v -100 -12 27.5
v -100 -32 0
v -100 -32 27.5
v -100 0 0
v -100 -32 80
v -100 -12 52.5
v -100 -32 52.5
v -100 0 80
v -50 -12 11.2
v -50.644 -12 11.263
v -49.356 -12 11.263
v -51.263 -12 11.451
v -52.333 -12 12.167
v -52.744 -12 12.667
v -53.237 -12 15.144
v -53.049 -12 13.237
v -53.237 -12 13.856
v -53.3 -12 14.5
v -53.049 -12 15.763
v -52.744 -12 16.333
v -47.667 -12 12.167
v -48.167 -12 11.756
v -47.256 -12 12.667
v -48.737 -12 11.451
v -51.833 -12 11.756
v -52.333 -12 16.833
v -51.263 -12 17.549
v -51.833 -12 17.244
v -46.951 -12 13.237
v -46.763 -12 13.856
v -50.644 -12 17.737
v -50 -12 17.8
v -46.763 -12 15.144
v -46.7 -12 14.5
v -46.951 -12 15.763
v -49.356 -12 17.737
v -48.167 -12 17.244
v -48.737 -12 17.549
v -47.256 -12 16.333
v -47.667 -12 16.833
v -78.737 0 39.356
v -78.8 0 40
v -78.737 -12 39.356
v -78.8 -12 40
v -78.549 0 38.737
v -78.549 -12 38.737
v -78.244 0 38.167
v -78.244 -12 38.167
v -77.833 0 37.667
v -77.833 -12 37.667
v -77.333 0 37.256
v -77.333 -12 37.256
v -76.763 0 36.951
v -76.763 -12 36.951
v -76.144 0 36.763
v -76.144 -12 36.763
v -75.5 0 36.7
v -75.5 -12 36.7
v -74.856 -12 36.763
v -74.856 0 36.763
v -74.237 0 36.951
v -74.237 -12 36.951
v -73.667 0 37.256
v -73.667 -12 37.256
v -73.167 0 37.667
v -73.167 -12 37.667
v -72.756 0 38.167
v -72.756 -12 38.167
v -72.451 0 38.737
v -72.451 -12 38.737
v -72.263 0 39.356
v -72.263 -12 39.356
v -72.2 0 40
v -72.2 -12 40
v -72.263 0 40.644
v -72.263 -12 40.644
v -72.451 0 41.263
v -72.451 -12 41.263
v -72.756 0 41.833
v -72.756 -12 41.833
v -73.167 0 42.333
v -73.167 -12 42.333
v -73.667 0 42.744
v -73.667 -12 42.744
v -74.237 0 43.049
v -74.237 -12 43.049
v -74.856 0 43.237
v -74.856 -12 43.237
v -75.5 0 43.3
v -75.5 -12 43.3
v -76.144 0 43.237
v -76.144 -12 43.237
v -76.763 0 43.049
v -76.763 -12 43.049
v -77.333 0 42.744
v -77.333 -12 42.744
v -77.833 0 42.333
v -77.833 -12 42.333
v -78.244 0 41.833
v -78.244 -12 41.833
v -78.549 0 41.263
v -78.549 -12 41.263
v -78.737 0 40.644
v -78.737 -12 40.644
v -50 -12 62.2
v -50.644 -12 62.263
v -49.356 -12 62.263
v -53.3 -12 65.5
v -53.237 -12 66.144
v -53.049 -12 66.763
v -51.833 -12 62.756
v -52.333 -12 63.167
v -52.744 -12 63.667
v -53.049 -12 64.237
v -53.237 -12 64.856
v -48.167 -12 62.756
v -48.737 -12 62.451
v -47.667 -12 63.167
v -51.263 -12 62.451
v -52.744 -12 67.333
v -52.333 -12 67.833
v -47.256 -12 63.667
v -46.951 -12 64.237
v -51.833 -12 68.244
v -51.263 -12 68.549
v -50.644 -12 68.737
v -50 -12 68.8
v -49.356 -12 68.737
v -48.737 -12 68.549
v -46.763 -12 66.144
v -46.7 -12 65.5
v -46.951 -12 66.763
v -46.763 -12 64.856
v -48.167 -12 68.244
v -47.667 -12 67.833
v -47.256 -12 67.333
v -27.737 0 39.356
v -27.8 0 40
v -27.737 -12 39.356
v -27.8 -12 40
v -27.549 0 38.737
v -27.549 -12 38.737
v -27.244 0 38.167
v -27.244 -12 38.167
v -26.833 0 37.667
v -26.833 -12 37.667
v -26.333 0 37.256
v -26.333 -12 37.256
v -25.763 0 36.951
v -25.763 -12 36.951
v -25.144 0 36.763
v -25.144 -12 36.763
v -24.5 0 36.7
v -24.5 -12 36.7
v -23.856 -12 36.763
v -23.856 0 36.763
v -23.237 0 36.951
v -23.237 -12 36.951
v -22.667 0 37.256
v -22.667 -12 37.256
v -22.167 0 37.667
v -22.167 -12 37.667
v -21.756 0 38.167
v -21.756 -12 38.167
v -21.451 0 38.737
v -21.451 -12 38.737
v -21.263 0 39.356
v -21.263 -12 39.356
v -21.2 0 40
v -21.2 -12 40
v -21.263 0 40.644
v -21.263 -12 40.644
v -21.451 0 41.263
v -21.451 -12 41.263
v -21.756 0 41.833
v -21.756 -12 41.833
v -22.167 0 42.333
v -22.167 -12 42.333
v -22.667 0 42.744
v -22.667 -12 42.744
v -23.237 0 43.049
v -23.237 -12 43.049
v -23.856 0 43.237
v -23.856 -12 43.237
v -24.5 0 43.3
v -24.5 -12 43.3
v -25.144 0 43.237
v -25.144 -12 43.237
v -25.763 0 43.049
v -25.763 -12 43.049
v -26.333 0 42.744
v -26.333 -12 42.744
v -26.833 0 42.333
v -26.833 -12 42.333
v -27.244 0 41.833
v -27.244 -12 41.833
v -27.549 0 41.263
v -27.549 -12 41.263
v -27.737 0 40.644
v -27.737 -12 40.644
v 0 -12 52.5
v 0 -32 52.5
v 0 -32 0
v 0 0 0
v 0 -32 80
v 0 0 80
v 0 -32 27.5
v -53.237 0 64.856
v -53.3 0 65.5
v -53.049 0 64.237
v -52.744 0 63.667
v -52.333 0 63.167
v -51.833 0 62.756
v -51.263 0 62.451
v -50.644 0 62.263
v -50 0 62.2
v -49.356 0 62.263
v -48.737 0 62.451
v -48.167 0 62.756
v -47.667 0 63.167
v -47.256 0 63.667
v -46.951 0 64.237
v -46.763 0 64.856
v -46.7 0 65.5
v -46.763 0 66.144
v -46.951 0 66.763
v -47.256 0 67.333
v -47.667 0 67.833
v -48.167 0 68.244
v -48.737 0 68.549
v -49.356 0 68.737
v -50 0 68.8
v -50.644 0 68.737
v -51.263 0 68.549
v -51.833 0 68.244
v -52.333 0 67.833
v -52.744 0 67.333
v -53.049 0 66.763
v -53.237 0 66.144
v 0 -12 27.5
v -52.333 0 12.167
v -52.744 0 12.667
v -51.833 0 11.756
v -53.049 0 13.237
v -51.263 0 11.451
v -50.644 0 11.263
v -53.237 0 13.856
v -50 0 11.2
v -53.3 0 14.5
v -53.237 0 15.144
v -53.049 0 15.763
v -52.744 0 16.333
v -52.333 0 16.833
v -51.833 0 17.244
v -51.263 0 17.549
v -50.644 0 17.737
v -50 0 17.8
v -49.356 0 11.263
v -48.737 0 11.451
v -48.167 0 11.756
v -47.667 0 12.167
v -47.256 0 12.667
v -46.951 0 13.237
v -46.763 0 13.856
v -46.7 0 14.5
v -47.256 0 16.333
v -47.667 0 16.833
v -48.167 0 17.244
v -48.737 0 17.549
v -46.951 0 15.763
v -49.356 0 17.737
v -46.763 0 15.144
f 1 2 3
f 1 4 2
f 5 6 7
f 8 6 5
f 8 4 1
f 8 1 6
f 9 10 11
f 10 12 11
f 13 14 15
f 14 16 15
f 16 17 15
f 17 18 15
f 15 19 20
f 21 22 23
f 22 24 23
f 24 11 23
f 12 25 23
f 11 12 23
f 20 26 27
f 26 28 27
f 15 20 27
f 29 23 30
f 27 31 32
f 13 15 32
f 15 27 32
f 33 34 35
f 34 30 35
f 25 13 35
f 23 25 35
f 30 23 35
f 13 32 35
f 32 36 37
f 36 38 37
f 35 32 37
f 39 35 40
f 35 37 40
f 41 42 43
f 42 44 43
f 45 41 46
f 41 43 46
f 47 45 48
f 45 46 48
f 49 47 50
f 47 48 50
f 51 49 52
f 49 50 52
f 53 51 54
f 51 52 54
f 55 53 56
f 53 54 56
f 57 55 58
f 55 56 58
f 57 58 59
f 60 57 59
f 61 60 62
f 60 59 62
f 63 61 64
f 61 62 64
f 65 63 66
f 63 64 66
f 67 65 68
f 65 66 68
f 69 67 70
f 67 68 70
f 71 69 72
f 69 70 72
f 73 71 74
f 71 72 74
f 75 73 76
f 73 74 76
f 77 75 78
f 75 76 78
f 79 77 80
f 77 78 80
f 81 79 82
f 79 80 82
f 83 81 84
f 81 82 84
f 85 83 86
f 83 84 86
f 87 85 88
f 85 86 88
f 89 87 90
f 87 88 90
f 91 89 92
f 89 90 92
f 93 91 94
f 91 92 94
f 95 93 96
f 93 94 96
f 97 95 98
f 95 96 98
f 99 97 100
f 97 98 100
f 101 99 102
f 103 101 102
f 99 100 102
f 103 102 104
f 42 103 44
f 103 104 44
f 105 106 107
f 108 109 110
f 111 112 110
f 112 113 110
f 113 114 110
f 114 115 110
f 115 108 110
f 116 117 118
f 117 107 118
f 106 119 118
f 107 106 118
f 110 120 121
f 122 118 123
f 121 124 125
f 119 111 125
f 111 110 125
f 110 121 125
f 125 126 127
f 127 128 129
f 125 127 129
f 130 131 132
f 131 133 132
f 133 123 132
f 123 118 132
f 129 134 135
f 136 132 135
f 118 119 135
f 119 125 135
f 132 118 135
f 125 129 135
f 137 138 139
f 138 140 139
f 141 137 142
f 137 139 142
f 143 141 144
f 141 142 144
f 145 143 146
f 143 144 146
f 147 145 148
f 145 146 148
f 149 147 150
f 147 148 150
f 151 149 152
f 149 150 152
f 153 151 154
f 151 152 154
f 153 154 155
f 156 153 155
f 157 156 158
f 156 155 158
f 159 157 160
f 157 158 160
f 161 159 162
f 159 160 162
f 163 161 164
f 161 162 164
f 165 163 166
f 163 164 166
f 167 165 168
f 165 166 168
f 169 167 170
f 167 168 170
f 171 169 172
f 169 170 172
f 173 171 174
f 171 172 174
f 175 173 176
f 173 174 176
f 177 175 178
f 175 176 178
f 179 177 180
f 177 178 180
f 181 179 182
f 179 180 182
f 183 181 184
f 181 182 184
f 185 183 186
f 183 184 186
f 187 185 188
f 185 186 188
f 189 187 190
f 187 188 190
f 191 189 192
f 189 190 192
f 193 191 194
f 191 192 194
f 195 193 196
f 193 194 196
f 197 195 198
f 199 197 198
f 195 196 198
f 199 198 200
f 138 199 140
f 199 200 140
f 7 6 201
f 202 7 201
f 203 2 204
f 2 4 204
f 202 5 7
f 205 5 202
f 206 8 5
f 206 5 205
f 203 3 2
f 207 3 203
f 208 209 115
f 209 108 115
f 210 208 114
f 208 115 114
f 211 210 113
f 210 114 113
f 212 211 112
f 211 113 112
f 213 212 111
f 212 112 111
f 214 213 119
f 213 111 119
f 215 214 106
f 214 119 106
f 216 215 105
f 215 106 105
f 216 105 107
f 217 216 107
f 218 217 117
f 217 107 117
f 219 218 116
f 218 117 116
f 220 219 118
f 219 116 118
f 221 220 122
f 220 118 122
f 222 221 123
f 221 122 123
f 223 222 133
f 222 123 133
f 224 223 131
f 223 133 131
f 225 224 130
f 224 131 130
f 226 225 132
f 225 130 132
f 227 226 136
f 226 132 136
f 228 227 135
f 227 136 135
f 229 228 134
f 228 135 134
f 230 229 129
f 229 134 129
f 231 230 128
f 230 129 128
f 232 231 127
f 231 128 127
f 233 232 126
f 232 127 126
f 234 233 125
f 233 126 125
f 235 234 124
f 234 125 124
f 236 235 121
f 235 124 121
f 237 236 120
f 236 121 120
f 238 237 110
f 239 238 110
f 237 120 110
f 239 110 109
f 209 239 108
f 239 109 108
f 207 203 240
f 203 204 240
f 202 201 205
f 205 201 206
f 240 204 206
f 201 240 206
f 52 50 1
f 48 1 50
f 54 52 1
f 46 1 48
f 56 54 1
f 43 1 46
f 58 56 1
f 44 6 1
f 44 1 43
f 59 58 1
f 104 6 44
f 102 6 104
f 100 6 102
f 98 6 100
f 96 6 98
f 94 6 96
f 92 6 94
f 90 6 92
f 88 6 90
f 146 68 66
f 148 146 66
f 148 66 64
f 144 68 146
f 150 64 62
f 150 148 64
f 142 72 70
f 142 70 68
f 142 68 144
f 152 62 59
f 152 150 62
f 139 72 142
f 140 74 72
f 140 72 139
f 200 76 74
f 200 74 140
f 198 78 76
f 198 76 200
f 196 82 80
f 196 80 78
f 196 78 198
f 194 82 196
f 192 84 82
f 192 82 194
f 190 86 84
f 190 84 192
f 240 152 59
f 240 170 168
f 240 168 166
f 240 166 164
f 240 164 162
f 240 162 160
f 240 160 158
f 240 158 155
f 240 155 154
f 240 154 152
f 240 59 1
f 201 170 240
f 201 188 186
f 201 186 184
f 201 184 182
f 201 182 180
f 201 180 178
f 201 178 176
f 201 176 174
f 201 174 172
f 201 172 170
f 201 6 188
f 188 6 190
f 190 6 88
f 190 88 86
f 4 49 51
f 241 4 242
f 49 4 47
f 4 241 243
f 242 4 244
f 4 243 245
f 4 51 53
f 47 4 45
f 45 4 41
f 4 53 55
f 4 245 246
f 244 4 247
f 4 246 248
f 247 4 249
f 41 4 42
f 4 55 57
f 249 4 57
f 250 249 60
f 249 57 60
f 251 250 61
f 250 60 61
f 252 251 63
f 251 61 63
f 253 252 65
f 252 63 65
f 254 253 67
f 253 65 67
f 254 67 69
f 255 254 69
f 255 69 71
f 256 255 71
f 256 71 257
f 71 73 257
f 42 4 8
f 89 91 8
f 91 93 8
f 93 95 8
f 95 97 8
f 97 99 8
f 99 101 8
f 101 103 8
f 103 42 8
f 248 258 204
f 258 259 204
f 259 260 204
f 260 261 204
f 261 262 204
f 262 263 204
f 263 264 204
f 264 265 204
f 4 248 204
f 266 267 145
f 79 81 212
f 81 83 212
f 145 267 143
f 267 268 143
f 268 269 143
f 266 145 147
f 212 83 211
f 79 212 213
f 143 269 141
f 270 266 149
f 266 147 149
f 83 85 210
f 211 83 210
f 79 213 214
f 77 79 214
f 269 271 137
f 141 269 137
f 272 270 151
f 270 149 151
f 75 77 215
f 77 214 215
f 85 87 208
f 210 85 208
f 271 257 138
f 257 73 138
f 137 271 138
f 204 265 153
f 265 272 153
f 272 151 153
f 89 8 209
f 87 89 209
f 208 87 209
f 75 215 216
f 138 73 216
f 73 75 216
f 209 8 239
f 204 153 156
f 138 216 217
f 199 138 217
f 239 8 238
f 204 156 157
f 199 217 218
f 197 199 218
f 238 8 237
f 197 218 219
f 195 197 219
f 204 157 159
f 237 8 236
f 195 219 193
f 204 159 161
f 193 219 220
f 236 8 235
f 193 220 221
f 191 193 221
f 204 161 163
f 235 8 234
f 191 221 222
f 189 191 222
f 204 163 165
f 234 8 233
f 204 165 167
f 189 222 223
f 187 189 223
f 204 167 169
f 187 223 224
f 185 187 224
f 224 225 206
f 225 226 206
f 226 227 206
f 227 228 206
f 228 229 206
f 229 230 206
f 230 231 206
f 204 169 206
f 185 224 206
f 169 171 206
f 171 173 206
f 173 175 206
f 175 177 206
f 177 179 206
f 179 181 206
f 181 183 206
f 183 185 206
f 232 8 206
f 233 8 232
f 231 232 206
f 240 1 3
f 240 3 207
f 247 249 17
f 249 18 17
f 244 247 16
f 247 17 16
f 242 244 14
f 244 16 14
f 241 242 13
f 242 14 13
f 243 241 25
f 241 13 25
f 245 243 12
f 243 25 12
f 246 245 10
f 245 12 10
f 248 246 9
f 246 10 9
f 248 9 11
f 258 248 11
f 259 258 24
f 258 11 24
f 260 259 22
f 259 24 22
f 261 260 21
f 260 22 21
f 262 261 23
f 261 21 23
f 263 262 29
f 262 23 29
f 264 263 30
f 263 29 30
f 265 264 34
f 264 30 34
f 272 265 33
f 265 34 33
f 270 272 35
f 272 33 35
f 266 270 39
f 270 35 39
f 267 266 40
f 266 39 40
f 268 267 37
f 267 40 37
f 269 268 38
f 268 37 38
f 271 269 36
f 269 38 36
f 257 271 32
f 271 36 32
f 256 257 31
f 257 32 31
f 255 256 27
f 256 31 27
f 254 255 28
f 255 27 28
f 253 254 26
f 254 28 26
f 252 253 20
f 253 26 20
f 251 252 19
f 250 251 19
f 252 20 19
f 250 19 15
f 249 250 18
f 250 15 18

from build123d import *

# Parameters (mm, degrees)
F0_W     = 100
F0_H     = 80
F1_DEPTH = 12
F2_D     = 6.6
F2_DEPTH = 12
F2_TIP   = 1.9828400428
F3_W     = 100
F3_H     = 27.5
F4_DEPTH = 20


with BuildPart() as f1:
    # F0 (on Front) → F1 (new body)
    with BuildSketch(Plane.XZ):
        with Locations((-50, 40)):
            Rectangle(F0_W, F0_H)
    extrude(amount=F1_DEPTH)

    # F2
    with Locations(Plane(origin=(0, 0, 0), x_dir=(1, 0, 0), z_dir=(0, 1, 0))):
        with Locations((-75.5, -40), (-50, -14.5), (-50, -65.5), (-24.5, -40)):
            Hole(F2_D / 2, depth=F2_DEPTH)
            with Locations((0, 0, -(F2_DEPTH + F2_TIP / 2))):  # 118° drill point
                Cone(0, F2_D / 2, F2_TIP, mode=Mode.SUBTRACT)

    # F3 (on face) → F4 (join)
    with BuildSketch(Plane.XZ.offset(12)):
        with Locations((-50, 13.75)):
            Rectangle(F3_W, F3_H)
        with Locations((-50, 66.25)):
            Rectangle(F3_W, F3_H)
    extrude(amount=F4_DEPTH)


solid = f1.part
